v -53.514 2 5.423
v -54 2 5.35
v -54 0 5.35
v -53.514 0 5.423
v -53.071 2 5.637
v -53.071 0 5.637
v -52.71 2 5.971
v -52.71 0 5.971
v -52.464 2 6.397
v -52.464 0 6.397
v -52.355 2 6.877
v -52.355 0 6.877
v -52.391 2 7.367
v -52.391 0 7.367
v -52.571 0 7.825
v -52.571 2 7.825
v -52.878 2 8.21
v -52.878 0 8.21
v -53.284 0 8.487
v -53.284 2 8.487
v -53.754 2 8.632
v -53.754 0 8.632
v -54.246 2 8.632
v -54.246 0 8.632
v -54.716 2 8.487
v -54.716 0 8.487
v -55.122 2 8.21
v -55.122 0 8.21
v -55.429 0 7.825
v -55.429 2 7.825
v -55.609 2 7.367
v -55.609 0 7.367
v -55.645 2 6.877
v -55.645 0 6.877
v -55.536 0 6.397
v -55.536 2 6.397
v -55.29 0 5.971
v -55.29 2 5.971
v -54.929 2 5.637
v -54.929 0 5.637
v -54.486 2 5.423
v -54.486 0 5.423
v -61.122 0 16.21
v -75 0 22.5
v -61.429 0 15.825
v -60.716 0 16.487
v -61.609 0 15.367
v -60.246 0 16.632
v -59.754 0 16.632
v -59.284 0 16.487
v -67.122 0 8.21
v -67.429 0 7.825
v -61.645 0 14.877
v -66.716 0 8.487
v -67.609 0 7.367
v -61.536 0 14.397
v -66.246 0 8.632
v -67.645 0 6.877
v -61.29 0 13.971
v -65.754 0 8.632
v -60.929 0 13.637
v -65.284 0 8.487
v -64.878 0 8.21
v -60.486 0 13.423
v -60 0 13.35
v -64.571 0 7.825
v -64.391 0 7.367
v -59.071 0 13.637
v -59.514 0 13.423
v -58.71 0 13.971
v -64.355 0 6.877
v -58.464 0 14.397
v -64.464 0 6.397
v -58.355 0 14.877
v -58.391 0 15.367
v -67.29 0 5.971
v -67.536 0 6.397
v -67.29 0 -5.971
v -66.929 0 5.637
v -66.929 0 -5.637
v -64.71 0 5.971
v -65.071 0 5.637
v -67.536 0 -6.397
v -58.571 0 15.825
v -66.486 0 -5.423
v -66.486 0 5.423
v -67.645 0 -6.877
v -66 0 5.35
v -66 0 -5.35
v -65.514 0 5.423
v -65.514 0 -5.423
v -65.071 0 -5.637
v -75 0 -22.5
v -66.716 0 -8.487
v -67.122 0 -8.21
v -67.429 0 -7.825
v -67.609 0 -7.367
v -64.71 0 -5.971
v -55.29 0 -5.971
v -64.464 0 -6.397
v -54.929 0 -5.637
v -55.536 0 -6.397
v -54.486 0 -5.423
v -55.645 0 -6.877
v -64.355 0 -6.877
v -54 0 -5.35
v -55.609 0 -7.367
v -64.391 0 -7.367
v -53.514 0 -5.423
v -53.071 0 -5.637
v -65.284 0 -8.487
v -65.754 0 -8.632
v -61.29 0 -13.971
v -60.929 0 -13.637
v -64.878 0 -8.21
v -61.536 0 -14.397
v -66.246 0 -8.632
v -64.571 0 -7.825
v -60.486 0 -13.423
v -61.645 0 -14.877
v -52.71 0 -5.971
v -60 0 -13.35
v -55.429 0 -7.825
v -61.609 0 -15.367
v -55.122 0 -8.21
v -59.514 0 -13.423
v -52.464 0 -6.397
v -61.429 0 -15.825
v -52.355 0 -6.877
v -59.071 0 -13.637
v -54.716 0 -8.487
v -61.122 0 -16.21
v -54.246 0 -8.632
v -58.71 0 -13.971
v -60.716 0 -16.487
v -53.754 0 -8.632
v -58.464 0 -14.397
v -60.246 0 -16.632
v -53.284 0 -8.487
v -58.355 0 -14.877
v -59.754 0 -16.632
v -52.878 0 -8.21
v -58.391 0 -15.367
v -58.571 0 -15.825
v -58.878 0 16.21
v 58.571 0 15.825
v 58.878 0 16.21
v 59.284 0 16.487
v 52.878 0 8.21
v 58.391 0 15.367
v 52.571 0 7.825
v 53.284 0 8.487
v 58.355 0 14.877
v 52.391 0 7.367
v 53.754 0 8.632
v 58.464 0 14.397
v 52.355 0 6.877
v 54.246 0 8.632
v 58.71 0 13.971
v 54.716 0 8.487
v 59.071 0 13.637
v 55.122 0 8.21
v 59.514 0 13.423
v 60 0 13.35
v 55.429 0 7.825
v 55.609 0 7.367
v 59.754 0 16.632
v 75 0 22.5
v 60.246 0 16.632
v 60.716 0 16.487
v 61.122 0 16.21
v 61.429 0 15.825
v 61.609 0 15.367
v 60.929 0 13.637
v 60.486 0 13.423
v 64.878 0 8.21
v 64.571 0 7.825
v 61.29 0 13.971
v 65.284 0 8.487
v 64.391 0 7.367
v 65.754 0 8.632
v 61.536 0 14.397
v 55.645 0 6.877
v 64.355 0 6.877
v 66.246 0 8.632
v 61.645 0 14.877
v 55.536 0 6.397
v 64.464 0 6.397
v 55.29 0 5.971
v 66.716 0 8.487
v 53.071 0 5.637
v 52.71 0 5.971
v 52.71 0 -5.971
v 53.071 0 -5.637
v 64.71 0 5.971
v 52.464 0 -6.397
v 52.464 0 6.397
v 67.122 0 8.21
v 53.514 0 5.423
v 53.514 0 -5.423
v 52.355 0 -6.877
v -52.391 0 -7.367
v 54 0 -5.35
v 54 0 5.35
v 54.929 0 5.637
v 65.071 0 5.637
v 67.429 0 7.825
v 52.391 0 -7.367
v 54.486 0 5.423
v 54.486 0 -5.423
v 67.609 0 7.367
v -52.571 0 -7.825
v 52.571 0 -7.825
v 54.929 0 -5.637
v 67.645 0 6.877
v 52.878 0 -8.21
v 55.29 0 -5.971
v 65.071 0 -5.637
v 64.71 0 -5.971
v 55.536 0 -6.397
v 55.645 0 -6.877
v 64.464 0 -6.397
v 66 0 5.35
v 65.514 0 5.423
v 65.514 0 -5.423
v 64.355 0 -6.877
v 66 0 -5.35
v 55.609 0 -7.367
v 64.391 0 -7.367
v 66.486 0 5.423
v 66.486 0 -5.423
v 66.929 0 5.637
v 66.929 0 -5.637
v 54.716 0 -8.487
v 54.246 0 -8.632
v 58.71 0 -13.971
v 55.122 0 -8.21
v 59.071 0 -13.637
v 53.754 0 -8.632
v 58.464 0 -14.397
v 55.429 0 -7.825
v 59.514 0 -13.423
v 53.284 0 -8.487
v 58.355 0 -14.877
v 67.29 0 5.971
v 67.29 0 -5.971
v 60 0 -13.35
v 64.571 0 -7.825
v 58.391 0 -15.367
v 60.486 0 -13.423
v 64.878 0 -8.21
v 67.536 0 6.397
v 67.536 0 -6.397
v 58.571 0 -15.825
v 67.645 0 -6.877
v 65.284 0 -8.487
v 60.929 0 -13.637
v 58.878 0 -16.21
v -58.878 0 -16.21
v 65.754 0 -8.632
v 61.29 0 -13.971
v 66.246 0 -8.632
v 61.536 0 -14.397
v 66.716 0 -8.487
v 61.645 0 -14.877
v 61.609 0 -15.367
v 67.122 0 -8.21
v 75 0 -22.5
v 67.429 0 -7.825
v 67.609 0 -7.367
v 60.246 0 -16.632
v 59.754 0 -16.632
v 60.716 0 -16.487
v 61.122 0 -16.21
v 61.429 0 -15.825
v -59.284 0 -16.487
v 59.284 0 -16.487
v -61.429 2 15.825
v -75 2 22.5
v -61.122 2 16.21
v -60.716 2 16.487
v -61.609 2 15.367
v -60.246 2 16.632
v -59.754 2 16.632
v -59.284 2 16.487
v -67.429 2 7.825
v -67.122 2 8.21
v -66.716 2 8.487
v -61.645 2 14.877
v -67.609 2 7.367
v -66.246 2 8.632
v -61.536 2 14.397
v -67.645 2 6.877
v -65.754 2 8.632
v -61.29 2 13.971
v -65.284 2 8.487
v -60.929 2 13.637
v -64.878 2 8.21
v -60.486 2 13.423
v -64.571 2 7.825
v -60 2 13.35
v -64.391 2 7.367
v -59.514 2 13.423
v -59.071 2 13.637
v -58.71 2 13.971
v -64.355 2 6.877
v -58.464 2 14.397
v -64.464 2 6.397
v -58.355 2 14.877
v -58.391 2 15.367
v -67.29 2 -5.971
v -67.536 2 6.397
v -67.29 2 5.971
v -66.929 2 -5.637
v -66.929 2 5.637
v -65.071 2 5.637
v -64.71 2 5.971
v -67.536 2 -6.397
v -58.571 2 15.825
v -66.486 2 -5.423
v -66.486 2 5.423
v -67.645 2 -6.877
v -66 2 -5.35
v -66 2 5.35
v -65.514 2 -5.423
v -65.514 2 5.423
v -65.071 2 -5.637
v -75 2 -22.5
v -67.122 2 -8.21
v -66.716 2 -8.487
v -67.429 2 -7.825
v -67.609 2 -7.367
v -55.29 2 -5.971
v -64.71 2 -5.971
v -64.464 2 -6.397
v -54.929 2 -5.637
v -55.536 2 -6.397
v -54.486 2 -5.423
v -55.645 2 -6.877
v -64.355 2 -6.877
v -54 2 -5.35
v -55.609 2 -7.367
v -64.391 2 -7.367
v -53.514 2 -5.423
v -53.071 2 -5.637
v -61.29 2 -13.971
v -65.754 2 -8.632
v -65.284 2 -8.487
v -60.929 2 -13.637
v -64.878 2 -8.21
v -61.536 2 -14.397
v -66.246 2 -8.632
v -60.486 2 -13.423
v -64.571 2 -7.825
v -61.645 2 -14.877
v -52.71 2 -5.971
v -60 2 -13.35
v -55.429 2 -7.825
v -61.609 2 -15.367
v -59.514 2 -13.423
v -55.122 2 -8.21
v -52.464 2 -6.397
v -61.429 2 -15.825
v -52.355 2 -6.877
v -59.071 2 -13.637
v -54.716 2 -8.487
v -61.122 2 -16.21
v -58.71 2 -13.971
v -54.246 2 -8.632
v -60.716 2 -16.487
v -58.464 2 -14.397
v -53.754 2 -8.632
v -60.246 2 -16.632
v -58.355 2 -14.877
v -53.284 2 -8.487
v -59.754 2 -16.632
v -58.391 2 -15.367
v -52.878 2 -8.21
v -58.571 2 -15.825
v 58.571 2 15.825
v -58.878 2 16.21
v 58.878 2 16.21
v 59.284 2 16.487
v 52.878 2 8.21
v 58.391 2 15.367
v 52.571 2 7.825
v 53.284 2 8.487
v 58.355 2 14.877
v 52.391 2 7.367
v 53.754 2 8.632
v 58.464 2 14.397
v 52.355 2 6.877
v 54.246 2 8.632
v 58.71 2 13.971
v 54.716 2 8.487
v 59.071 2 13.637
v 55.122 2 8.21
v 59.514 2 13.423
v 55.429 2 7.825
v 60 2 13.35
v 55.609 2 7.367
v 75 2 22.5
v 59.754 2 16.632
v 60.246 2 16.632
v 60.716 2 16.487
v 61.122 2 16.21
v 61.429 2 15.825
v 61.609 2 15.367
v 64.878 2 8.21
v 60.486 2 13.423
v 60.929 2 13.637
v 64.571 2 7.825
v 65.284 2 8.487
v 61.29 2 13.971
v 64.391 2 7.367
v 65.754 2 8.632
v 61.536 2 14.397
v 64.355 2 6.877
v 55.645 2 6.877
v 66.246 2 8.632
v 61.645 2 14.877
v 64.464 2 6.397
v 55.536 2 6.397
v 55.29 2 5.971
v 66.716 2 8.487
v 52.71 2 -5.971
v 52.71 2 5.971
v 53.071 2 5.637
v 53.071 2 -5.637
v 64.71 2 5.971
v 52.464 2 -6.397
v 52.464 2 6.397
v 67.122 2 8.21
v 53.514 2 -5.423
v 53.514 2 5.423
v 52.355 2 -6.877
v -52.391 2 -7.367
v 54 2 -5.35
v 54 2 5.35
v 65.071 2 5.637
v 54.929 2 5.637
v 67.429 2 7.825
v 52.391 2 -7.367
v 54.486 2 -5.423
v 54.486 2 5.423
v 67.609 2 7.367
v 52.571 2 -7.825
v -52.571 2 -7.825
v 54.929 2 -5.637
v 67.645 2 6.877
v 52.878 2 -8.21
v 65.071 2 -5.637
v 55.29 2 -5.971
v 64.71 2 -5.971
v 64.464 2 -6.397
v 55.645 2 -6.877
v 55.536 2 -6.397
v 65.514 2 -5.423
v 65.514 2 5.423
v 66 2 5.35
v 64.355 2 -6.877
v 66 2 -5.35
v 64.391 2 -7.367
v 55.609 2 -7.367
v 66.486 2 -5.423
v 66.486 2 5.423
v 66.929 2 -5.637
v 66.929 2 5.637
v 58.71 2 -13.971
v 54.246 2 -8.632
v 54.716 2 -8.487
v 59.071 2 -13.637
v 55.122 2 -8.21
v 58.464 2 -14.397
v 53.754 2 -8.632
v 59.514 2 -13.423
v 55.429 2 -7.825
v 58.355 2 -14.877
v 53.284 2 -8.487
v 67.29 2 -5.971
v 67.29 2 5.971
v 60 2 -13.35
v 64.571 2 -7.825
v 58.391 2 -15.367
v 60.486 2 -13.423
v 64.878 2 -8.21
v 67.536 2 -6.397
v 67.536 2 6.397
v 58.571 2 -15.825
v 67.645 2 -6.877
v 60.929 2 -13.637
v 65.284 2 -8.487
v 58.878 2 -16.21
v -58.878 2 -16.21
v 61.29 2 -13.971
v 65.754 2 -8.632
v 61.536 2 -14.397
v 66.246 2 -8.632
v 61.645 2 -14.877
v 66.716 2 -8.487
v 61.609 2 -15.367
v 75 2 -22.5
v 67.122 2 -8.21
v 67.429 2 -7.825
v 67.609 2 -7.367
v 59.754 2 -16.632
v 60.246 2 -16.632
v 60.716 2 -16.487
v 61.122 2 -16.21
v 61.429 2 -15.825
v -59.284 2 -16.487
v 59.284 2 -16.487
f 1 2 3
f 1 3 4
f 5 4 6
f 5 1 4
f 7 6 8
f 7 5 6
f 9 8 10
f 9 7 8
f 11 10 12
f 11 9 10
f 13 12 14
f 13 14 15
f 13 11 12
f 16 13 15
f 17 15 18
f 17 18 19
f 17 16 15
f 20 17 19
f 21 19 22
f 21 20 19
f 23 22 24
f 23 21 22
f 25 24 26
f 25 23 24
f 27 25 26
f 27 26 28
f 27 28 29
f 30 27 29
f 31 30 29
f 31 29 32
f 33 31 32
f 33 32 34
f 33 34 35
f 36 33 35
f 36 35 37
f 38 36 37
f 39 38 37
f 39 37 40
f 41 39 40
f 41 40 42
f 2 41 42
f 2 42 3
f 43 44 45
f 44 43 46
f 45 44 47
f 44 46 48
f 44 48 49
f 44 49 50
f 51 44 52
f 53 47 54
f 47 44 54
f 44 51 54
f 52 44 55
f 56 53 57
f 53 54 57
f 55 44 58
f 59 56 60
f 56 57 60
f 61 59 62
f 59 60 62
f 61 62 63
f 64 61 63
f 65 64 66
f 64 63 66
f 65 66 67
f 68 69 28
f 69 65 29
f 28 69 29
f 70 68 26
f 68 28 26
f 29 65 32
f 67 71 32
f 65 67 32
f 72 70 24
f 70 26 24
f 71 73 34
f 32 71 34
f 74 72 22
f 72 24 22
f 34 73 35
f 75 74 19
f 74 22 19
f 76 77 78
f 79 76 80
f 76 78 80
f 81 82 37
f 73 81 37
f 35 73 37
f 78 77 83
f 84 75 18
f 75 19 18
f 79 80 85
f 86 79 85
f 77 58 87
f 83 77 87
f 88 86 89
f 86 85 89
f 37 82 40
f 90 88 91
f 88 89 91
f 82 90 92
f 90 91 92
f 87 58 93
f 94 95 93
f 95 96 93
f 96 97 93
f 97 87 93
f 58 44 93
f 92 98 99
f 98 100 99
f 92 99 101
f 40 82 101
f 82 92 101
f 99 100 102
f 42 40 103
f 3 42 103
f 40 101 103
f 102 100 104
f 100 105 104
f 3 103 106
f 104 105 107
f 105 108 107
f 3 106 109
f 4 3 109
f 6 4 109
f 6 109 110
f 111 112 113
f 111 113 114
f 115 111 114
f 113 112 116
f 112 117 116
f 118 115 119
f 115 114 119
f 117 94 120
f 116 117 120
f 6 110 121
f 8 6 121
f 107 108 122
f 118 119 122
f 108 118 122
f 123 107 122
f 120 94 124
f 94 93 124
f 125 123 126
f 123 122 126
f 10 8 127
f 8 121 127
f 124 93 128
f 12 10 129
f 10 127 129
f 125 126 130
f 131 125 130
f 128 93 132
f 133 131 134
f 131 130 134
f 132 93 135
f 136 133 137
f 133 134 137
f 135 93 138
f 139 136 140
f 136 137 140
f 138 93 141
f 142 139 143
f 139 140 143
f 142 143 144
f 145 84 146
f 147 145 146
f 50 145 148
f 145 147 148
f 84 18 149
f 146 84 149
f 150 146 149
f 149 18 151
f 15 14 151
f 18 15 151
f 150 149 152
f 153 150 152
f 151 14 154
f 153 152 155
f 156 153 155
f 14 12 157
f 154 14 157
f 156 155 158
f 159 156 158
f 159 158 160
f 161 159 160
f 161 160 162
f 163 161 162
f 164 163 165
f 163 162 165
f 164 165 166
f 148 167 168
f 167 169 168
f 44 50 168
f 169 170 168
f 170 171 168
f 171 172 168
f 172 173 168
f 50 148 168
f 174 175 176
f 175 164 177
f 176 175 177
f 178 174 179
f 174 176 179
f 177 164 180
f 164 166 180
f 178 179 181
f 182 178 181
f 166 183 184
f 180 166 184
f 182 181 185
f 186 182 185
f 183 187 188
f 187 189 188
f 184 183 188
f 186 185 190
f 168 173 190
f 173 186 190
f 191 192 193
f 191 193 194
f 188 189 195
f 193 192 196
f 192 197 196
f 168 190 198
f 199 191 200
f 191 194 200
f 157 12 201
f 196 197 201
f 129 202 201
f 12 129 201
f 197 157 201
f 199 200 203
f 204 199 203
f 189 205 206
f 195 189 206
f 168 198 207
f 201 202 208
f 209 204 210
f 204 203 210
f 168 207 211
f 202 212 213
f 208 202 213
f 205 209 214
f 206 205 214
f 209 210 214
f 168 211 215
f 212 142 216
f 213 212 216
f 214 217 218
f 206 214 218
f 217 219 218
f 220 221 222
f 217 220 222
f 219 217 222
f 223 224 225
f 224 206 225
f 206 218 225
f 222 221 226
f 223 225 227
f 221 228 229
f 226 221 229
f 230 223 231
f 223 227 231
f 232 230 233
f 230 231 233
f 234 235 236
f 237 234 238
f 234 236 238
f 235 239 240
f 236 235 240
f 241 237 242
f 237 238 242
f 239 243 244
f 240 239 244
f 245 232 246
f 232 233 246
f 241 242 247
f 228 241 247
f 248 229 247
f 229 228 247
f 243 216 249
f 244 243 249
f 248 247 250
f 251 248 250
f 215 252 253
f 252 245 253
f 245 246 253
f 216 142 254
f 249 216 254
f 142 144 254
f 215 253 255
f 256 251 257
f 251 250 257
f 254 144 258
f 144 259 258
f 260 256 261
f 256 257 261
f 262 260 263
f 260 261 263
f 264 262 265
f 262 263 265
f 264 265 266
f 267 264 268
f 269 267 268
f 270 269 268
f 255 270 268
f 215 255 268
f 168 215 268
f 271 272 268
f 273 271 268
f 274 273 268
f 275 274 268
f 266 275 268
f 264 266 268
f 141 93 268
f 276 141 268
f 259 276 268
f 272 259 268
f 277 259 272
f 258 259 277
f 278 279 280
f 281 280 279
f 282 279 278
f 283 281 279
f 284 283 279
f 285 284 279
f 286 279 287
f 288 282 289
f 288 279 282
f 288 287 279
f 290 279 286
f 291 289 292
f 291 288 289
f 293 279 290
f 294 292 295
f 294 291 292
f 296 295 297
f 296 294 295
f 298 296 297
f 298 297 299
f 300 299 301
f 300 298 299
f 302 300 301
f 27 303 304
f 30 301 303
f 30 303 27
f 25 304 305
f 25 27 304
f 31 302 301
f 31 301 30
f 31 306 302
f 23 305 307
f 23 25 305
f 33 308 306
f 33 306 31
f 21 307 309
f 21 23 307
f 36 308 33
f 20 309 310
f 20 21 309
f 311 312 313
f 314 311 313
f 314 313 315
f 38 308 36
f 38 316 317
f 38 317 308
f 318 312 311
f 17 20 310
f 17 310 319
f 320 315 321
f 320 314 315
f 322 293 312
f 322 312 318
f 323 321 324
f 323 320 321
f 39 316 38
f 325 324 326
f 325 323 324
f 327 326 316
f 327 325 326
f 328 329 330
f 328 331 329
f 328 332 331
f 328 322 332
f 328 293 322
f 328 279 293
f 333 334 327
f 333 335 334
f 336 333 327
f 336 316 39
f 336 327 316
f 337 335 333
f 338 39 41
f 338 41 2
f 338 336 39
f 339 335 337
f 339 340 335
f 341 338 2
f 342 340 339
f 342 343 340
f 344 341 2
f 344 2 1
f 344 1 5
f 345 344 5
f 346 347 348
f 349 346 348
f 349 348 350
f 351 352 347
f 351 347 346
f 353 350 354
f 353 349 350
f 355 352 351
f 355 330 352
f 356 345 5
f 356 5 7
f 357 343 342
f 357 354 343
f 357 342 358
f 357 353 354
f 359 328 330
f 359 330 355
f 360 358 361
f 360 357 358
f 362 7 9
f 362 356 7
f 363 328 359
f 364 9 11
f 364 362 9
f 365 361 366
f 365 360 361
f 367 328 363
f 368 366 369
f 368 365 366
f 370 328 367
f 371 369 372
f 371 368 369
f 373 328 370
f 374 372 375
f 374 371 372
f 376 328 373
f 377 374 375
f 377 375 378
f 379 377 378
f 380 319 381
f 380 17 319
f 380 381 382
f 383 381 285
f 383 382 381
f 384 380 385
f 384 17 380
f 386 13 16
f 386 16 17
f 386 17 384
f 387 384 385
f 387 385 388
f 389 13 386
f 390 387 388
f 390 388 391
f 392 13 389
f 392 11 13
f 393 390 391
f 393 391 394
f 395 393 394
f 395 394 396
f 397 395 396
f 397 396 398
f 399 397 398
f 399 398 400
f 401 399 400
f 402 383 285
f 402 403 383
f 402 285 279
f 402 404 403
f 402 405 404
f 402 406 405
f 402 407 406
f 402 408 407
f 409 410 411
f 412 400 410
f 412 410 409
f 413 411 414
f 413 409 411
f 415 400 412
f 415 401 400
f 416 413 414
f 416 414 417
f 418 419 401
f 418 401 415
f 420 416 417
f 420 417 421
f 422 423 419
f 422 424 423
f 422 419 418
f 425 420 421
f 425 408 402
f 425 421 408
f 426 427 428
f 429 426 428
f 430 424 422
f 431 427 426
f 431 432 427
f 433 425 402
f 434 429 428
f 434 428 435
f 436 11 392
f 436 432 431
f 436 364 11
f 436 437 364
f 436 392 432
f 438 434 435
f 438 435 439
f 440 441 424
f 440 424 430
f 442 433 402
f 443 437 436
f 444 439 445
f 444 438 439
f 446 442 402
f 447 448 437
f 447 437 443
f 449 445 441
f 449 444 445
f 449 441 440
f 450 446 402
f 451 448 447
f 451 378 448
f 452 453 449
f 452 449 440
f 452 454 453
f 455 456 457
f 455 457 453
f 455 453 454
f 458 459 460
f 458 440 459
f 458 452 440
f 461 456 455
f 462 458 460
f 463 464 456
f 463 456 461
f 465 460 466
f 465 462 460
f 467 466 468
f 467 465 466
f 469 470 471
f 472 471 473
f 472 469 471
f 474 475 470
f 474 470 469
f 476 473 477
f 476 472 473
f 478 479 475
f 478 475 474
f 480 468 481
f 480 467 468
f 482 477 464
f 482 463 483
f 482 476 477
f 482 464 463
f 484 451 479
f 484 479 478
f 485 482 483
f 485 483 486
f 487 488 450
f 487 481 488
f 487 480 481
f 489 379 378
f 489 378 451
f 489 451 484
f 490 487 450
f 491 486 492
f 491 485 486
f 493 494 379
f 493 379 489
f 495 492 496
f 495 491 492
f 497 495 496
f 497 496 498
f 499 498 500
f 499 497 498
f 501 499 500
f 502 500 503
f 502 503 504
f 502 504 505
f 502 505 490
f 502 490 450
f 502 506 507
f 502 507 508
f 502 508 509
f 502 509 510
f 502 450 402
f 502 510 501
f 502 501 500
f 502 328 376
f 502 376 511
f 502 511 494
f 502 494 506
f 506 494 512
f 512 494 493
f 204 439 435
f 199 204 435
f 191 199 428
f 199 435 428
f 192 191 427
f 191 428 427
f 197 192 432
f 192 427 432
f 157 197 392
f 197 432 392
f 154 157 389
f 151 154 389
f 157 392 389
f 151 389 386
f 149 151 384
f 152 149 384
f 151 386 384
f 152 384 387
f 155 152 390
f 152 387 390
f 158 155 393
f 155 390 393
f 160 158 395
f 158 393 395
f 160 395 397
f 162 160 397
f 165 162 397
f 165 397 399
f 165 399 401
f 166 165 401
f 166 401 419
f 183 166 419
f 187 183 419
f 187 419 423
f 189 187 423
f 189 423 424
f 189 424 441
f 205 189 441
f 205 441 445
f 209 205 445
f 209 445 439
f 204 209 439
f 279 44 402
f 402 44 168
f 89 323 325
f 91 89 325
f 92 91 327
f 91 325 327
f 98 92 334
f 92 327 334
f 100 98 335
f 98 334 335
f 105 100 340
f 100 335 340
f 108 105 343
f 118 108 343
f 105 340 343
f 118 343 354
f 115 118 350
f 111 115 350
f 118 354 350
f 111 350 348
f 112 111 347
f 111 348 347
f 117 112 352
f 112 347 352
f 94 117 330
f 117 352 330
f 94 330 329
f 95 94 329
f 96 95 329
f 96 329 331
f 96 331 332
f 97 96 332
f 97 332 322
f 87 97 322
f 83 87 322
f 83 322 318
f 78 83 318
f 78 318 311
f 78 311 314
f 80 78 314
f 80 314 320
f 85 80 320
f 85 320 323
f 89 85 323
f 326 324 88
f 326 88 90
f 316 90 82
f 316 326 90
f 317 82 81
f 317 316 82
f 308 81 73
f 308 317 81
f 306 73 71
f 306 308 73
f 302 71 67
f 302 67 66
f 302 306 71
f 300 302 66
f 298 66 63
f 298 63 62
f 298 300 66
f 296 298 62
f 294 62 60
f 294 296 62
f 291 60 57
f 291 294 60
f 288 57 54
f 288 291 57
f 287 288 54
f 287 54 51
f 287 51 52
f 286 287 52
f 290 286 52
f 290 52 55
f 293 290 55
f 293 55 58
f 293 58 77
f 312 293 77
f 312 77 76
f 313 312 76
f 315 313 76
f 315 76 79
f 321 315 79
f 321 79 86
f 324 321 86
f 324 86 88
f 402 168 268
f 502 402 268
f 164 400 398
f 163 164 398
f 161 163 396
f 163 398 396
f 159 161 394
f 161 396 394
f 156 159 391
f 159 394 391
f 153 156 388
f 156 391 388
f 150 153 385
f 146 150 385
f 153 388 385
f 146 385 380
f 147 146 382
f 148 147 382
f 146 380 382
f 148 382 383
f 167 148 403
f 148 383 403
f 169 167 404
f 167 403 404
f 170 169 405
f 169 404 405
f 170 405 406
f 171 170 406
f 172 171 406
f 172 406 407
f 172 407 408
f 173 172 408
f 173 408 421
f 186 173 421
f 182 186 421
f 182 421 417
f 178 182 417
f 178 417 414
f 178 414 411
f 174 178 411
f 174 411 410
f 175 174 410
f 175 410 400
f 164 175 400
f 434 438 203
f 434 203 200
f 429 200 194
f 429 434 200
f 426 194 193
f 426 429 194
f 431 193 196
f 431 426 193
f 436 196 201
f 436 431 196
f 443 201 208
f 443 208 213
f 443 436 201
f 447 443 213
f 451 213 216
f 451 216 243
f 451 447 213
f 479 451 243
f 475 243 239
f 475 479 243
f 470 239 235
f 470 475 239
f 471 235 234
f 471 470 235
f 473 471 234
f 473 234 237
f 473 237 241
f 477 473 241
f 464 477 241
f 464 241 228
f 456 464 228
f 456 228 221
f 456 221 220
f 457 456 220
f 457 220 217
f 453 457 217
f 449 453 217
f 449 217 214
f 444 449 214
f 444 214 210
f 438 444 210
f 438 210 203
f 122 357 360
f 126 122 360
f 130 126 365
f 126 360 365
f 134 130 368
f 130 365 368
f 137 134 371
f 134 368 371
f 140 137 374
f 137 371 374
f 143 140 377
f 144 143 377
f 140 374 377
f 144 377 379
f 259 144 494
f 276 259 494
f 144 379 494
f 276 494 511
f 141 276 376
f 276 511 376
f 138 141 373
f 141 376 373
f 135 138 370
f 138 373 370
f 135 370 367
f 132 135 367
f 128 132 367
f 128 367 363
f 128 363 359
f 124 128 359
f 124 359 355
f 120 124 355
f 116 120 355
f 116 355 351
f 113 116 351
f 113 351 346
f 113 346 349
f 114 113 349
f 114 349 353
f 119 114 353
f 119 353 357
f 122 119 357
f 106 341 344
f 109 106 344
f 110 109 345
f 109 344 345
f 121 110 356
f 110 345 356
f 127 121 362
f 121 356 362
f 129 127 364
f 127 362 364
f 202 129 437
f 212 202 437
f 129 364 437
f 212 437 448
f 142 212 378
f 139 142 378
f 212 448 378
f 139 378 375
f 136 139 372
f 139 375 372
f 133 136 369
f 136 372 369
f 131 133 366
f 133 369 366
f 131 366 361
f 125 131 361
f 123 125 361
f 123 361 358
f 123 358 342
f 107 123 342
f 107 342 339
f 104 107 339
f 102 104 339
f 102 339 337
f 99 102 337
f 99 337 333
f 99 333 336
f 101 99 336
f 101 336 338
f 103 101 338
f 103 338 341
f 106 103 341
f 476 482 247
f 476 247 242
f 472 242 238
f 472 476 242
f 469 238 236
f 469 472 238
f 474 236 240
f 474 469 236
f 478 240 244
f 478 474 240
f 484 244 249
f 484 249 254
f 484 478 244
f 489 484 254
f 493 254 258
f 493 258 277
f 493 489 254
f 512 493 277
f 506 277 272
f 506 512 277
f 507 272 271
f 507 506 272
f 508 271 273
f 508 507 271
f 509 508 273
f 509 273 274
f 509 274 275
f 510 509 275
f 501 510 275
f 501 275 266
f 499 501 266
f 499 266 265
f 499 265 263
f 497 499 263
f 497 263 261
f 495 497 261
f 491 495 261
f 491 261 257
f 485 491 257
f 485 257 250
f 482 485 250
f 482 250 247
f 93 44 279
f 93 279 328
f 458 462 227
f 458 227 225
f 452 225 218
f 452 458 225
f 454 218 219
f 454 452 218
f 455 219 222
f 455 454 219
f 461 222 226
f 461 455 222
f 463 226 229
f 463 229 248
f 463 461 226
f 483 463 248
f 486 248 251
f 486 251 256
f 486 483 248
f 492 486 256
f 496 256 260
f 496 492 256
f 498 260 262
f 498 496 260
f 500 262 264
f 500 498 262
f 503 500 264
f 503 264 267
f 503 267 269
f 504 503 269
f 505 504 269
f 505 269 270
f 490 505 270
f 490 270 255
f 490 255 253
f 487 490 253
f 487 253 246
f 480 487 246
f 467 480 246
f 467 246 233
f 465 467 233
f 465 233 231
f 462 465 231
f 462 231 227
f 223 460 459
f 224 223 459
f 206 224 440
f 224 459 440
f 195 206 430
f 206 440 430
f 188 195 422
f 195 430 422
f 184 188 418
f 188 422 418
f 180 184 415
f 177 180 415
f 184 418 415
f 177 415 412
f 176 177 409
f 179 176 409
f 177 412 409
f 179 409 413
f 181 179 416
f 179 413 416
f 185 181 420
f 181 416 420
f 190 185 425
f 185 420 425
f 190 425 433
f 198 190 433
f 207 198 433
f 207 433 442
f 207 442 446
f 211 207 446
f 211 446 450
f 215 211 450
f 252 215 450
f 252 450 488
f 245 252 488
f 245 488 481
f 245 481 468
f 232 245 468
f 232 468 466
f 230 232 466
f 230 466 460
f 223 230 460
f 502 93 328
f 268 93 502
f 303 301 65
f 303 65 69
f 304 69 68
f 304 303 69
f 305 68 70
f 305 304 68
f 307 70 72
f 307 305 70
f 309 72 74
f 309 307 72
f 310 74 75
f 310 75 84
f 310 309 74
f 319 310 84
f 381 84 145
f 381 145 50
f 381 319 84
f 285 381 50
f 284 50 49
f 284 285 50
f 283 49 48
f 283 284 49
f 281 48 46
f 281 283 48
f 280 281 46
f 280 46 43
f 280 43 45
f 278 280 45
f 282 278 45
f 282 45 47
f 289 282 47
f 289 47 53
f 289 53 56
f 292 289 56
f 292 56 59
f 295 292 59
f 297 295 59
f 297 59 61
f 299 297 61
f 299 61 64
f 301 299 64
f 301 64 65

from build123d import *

# Parameters (mm, degrees)
SKETCH_1_W               = 150
SKETCH_1_H               = 45
EXTRUDE_1_DEPTH          = 2
CUT_EXTRUDE_1_REACH      = 80.328
SKETCH_2_R               = 1.65
MIRROR_2_COPY_1_REACH    = 80.328
MIRROR_2_COPY_1_SKETCH_R = 1.65


with BuildPart() as part:
    # 草图1 → 凸台-拉伸1 (new body)
    with BuildSketch(Plane(origin=(0, 0, 0), x_dir=(1, 0, 0), z_dir=(0, 1, 0))):
        Rectangle(SKETCH_1_W, SKETCH_1_H)
    extrude(amount=EXTRUDE_1_DEPTH)

    # 草图2 → 切除-拉伸1 (cut, up to next)
    with BuildSketch(Plane(origin=(0, 2, 0), x_dir=(1, 0, 0), z_dir=(0, 1, 0)), mode=Mode.PRIVATE) as cut_extrude_1_sk1:
        with Locations(Location((-60, 15, 0), (0, 0, 270))):
            Circle(SKETCH_2_R)
    cut_extrude_1_tool1 = extrude(cut_extrude_1_sk1.sketch, amount=-CUT_EXTRUDE_1_REACH, mode=Mode.PRIVATE) & part.part
    # 草图2 → 切除-拉伸1 (cut, up to next)
    with BuildSketch(Plane(origin=(0, 2, 0), x_dir=(1, 0, 0), z_dir=(0, 1, 0)), mode=Mode.PRIVATE) as cut_extrude_1_sk2:
        with Locations(Location((-66, 7, 0), (0, 0, 270))):
            Circle(SKETCH_2_R)
    cut_extrude_1_tool2 = extrude(cut_extrude_1_sk2.sketch, amount=-CUT_EXTRUDE_1_REACH, mode=Mode.PRIVATE) & part.part
    # 草图2 → 切除-拉伸1 (cut, up to next)
    with BuildSketch(Plane(origin=(0, 2, 0), x_dir=(1, 0, 0), z_dir=(0, 1, 0)), mode=Mode.PRIVATE) as cut_extrude_1_sk3:
        with Locations(Location((-54, 7, 0), (0, 0, 270))):
            Circle(SKETCH_2_R)
    cut_extrude_1_tool3 = extrude(cut_extrude_1_sk3.sketch, amount=-CUT_EXTRUDE_1_REACH, mode=Mode.PRIVATE) & part.part
    cut_extrude_1_1 = cut_extrude_1_tool1.solids().sort_by_distance((-60, 2, -15))[0]
    add(cut_extrude_1_1, mode=Mode.SUBTRACT)
    cut_extrude_1_2 = cut_extrude_1_tool2.solids().sort_by_distance((-66, 2, -7))[0]
    add(cut_extrude_1_2, mode=Mode.SUBTRACT)
    cut_extrude_1_3 = cut_extrude_1_tool3.solids().sort_by_distance((-54, 2, -7))[0]
    add(cut_extrude_1_3, mode=Mode.SUBTRACT)
    cut_extrude_1 = cut_extrude_1_1 + cut_extrude_1_2 + cut_extrude_1_3  # 切除-拉伸1 as one shape, for the pattern or mirror that repeats it

    # 镜向1: 切除-拉伸1 across plane
    add(cut_extrude_1.mirror(Plane.XY), mode=Mode.SUBTRACT)

    # 镜向2: 切除-拉伸1 across plane
    add(cut_extrude_1.mirror(Plane(origin=(0, 0, 0), x_dir=(0, 0, 1), z_dir=(1, 0, 0))), mode=Mode.SUBTRACT)

    # 镜向2 copy 1 sketch → 镜向2 copy 1 (cut, up to next)
    with BuildSketch(Plane(origin=(0, 2, 0), x_dir=(-1, 0, 0), z_dir=(0, 1, 0)), mode=Mode.PRIVATE) as mirror_2_copy_1_sk1:
        with Locations(Location((-60, 15, 0), (0, 0, 270))):
            Circle(MIRROR_2_COPY_1_SKETCH_R)
    mirror_2_copy_1_tool1 = extrude(mirror_2_copy_1_sk1.sketch, amount=-MIRROR_2_COPY_1_REACH, mode=Mode.PRIVATE) & part.part
    # 镜向2 copy 1 sketch → 镜向2 copy 1 (cut, up to next)
    with BuildSketch(Plane(origin=(0, 2, 0), x_dir=(-1, 0, 0), z_dir=(0, 1, 0)), mode=Mode.PRIVATE) as mirror_2_copy_1_sk2:
        with Locations(Location((-66, 7, 0), (0, 0, 270))):
            Circle(MIRROR_2_COPY_1_SKETCH_R)
    mirror_2_copy_1_tool2 = extrude(mirror_2_copy_1_sk2.sketch, amount=-MIRROR_2_COPY_1_REACH, mode=Mode.PRIVATE) & part.part
    # 镜向2 copy 1 sketch → 镜向2 copy 1 (cut, up to next)
    with BuildSketch(Plane(origin=(0, 2, 0), x_dir=(-1, 0, 0), z_dir=(0, 1, 0)), mode=Mode.PRIVATE) as mirror_2_copy_1_sk3:
        with Locations(Location((-54, 7, 0), (0, 0, 270))):
            Circle(MIRROR_2_COPY_1_SKETCH_R)
    mirror_2_copy_1_tool3 = extrude(mirror_2_copy_1_sk3.sketch, amount=-MIRROR_2_COPY_1_REACH, mode=Mode.PRIVATE) & part.part
    add(mirror_2_copy_1_tool1.solids().sort_by_distance((60, 2, 15))[0], mode=Mode.SUBTRACT)
    add(mirror_2_copy_1_tool2.solids().sort_by_distance((66, 2, 7))[0], mode=Mode.SUBTRACT)
    add(mirror_2_copy_1_tool3.solids().sort_by_distance((54, 2, 7))[0], mode=Mode.SUBTRACT)


solid = part.part
